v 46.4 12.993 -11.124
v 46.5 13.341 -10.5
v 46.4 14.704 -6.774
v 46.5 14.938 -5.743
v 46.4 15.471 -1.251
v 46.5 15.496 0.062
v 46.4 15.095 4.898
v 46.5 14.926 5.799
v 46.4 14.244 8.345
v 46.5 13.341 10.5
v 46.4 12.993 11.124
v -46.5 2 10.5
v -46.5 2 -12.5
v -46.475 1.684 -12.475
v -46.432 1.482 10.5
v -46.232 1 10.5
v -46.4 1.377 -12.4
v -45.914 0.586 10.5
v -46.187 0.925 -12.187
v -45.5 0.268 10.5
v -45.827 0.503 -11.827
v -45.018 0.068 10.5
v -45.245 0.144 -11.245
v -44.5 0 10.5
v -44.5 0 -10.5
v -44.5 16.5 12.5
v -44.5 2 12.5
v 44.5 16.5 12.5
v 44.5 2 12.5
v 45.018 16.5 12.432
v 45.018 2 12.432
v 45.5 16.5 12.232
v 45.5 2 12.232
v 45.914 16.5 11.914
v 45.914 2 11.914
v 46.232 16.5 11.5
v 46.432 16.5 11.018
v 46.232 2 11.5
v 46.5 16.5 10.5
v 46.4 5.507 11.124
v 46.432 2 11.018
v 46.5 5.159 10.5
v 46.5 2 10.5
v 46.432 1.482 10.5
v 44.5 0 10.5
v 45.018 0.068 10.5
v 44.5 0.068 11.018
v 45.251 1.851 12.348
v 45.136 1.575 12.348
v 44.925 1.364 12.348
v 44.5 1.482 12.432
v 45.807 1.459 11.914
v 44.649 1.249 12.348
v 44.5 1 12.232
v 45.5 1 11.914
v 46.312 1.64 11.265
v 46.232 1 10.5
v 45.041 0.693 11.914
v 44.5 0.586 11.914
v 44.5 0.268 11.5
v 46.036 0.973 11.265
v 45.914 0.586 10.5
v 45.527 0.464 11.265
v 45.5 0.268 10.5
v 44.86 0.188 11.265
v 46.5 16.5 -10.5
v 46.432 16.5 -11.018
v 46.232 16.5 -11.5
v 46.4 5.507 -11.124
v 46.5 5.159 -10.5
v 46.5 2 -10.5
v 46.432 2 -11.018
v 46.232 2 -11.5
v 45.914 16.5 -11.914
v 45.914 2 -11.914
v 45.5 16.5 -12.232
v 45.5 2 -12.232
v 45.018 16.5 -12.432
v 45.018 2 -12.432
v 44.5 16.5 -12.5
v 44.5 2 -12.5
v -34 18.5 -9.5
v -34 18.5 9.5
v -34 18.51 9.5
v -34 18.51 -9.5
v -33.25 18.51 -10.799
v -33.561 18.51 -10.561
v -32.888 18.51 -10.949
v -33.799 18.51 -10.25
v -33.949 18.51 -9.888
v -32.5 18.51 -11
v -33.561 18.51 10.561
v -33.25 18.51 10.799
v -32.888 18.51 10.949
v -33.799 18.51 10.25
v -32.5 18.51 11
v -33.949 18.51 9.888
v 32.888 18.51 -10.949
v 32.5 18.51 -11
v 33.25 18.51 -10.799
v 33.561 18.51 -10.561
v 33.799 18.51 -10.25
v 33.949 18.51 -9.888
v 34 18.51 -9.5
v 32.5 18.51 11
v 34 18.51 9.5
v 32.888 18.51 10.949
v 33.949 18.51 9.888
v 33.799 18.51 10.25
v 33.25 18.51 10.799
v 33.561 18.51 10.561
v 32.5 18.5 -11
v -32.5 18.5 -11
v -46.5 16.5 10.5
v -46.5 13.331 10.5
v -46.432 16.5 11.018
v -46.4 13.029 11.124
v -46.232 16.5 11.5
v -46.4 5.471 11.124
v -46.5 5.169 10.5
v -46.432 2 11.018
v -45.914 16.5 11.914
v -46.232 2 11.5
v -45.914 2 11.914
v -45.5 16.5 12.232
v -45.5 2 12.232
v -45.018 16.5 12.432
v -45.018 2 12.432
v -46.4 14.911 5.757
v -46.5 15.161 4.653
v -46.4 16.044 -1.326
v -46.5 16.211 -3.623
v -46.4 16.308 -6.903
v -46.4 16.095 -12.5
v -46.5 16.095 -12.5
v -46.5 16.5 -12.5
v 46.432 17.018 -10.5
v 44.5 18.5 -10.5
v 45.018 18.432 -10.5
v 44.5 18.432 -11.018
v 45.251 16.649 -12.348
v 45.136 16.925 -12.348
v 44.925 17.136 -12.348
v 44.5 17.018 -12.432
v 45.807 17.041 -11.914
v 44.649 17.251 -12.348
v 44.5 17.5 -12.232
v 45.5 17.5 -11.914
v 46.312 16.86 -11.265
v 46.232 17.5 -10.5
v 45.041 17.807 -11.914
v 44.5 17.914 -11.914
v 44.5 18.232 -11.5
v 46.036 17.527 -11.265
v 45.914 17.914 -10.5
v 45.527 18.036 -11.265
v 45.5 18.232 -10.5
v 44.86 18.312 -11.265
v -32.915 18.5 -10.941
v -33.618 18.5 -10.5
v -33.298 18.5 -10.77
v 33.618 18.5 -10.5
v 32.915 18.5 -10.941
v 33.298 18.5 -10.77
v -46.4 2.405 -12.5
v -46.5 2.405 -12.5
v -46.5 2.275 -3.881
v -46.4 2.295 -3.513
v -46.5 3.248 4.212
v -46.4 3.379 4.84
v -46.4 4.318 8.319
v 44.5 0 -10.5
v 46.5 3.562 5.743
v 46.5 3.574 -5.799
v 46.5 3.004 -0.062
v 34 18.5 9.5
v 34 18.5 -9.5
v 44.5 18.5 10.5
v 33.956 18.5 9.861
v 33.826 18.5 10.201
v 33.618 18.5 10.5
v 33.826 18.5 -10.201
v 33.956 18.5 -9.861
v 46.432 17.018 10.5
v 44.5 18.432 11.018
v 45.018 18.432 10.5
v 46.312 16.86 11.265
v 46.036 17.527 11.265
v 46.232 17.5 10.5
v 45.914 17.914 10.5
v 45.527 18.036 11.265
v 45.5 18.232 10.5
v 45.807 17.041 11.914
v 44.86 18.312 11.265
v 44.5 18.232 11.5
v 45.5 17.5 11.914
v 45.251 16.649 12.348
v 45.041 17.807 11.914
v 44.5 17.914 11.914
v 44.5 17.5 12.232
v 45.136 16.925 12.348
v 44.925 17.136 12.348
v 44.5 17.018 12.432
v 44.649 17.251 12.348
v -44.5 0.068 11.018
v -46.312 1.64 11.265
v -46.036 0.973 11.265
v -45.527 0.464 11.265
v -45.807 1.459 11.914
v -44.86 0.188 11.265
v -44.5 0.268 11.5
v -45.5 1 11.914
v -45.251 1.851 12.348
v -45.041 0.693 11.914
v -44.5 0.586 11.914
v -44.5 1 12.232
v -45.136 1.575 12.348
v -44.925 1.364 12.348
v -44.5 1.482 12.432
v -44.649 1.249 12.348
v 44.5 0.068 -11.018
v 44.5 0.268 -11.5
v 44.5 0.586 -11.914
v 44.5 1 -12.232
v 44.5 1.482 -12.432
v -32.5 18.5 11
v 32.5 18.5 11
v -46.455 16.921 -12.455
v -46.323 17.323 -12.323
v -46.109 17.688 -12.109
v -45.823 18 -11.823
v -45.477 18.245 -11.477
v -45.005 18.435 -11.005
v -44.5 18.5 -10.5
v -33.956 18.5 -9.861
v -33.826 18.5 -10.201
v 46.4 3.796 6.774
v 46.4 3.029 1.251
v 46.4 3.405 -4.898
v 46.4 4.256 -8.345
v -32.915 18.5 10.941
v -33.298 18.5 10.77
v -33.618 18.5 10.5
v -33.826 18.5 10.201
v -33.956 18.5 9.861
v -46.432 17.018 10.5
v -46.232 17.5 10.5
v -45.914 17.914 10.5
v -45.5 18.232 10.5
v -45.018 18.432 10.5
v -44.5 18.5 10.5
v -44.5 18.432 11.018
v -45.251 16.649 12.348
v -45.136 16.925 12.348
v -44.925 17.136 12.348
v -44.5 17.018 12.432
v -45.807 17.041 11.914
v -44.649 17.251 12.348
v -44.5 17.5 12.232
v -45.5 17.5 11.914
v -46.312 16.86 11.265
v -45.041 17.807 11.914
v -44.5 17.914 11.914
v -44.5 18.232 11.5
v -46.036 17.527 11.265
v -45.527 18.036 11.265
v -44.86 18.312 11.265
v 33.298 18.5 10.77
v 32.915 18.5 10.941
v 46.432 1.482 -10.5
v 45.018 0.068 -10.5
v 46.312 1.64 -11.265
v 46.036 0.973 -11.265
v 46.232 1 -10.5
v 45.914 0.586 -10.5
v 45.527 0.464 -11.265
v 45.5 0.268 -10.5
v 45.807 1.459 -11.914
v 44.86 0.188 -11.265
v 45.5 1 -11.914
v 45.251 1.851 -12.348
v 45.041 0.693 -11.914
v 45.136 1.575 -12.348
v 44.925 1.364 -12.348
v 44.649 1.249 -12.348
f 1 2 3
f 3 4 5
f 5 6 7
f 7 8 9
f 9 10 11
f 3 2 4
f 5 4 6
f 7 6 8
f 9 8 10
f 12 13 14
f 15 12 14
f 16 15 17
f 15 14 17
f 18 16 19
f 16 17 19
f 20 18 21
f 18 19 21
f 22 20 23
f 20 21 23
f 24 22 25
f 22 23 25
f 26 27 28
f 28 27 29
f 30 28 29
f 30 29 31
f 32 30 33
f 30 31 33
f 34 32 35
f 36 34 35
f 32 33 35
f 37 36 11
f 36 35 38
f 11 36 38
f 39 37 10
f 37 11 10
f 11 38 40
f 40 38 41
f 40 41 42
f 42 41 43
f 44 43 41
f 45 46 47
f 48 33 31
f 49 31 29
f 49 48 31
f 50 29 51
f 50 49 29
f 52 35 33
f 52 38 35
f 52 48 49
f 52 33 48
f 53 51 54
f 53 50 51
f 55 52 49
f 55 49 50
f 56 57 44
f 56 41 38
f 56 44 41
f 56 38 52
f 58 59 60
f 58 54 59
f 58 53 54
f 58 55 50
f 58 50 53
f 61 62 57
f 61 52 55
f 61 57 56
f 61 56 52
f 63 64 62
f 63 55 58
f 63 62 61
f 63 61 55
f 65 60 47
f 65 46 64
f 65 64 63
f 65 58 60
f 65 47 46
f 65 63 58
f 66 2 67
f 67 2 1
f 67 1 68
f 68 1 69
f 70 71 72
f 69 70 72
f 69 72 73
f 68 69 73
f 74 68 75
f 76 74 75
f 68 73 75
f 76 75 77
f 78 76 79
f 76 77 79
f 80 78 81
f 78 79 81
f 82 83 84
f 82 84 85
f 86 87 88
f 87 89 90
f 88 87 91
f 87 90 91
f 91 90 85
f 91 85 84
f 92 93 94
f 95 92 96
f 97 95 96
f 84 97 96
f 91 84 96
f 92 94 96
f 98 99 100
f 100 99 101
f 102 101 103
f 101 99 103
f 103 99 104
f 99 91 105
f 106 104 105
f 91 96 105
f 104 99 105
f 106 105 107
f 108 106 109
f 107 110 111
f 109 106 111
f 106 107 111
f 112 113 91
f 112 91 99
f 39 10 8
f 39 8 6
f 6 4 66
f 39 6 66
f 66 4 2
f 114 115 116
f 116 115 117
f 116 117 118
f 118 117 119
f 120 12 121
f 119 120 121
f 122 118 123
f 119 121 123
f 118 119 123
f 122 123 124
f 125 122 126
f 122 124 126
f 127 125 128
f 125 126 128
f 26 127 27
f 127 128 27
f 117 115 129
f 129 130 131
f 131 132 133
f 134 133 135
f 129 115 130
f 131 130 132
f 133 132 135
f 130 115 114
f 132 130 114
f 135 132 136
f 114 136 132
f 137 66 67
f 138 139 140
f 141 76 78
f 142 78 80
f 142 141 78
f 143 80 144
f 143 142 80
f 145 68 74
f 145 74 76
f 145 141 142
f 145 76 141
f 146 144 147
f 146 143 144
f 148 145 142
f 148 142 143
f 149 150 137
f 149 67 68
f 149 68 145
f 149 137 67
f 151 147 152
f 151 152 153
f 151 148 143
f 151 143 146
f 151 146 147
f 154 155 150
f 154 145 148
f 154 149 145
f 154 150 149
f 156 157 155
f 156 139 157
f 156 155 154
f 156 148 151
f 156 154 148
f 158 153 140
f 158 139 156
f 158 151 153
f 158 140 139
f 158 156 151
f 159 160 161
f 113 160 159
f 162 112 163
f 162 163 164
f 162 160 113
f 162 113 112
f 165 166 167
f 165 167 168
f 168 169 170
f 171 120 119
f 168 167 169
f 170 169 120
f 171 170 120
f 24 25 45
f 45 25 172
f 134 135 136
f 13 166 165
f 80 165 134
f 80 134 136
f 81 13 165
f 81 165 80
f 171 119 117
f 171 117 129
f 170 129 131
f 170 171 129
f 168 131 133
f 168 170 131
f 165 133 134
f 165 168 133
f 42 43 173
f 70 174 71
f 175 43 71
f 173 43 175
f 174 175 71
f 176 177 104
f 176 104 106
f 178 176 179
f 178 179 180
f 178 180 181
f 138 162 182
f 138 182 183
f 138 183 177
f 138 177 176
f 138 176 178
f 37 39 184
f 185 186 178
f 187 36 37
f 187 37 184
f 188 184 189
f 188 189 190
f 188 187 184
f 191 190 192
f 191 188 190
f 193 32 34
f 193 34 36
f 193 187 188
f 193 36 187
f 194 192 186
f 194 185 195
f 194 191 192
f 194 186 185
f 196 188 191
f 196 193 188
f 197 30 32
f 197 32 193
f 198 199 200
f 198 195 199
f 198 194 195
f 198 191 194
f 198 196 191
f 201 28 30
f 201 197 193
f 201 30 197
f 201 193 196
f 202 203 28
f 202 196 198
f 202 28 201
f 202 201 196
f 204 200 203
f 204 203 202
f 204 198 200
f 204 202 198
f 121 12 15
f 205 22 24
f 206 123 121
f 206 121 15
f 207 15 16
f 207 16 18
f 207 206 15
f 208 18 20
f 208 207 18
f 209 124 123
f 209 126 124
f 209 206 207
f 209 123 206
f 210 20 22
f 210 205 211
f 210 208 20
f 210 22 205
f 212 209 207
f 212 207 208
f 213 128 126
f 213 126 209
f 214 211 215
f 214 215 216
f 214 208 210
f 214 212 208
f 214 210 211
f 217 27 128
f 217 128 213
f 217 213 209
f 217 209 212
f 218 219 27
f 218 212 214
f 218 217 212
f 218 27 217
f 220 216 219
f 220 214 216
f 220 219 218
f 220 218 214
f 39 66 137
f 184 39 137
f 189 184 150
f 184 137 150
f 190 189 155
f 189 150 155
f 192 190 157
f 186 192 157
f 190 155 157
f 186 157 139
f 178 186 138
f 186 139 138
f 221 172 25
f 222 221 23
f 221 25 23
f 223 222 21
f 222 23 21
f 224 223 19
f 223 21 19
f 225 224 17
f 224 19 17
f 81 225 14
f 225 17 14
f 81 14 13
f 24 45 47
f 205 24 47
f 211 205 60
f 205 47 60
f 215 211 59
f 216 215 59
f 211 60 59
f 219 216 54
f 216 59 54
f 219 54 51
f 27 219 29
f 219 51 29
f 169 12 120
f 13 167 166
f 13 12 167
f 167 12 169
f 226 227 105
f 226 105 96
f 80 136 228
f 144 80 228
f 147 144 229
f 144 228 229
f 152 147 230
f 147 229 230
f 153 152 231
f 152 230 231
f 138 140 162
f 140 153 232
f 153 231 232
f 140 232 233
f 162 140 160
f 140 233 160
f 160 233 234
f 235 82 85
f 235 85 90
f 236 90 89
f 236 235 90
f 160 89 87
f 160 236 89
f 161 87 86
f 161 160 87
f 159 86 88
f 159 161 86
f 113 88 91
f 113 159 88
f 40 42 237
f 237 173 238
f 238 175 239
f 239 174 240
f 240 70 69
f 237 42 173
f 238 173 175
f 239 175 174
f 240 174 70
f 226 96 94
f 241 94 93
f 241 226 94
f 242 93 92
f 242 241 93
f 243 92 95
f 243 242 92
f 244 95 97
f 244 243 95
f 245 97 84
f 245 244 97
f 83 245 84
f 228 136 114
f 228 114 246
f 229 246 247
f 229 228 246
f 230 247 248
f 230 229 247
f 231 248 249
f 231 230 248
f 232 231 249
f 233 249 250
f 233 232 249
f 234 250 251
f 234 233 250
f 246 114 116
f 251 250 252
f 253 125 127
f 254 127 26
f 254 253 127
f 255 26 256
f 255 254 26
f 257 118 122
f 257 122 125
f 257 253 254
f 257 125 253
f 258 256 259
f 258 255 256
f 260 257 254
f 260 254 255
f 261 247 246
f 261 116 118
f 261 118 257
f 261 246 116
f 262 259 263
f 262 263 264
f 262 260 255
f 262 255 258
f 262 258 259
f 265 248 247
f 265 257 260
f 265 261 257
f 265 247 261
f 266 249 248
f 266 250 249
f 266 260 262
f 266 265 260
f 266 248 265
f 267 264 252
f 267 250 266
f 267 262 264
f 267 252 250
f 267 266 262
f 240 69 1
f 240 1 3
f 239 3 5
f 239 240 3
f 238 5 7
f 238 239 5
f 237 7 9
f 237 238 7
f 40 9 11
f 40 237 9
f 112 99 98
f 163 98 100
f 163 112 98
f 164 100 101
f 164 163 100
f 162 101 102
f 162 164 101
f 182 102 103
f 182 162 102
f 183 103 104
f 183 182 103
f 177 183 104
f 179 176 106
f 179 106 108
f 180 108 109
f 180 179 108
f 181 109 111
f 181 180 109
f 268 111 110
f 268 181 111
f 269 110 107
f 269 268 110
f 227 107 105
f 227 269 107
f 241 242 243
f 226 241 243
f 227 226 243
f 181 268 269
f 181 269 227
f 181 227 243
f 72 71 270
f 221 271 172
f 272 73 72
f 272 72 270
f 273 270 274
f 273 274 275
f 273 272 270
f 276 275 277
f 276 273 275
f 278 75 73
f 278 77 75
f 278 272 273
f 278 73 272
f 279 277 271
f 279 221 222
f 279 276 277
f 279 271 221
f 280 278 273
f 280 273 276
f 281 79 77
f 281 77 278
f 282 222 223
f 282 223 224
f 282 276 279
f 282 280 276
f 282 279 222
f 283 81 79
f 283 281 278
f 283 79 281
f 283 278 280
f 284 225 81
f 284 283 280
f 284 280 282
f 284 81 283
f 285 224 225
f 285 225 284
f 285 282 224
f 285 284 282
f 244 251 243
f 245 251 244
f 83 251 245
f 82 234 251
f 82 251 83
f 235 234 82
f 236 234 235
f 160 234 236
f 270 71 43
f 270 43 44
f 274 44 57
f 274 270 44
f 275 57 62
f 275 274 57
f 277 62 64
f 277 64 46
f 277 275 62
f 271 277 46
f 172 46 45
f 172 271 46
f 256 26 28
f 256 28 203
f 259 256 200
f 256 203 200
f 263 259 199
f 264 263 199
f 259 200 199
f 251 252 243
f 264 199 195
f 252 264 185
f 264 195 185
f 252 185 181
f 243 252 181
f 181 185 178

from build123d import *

# Parameters (mm, degrees)
SKETCH1_W           = 93
SKETCH1_H           = 25
BOSS_EXTRUDE1_DEPTH = 18.5
FILLET1_R           = 2
FILLET2_R           = 2
BOSS_EXTRUDE2_DEPTH = 0.01
SKETCH4_RX          = 13.895867653
SKETCH4_RY          = 6.24610939
CUT_EXTRUDE1_DEPTH  = 0.1
SKETCH5_RX          = 21.704276093
SKETCH5_RY          = 7.058205551
CUT_EXTRUDE2_DEPTH  = 0.1


with BuildPart() as part:
    # Sketch1 → Boss-Extrude1 (new body)
    with BuildSketch(Plane(origin=(0, 0, 0), x_dir=(1, 0, 0), z_dir=(0, 1, 0))):
        Rectangle(SKETCH1_W, SKETCH1_H)
    extrude(amount=BOSS_EXTRUDE1_DEPTH)

    # Fillet1
    fillet1_edges = [part.edges().sort_by_distance(p)[0] for p in [
        (-46.5, 18.5, 0),
        (46.5, 18.5, 0),
        (-46.5, 0, 0),
        (46.5, 0, 0),
    ]]
    fillet(fillet1_edges, radius=FILLET1_R)

    # Fillet2
    # the kernel refuses this fillet: 2 mm, written as the material it takes off along each edge
    with BuildSketch(Plane(origin=(-49.5, 18.5, -12.5), x_dir=(0, -1, 0), z_dir=(1, 0, 0))) as fillet2_piece_1:
        with BuildLine():
            CenterArc((FILLET2_R, -FILLET2_R), FILLET2_R, 90, 90)
            Line((0, -FILLET2_R), (0, 0))
            Line((0, 0), (FILLET2_R, 0))
        make_face()
    extrude(amount=94, mode=Mode.SUBTRACT)
    with BuildSketch(Plane(origin=(44.5, 18.5, 12.5), x_dir=(0, 0, -1), z_dir=(-1, 0, 0))) as fillet2_piece_2:
        with BuildLine():
            CenterArc((FILLET2_R, FILLET2_R), FILLET2_R, 180, 90)
            Line((0, FILLET2_R), (0, 0))
            Line((0, 0), (FILLET2_R, 0))
        make_face()
    extrude(amount=89, mode=Mode.SUBTRACT)
    with BuildSketch(Plane(origin=(44.5, 0, 12.5), x_dir=(0, 0, -1), z_dir=(-1, 0, 0))) as fillet2_piece_3:
        with BuildLine():
            CenterArc((FILLET2_R, -FILLET2_R), FILLET2_R, 90, 90)
            Line((0, -FILLET2_R), (0, 0))
            Line((0, 0), (FILLET2_R, 0))
        make_face()
    extrude(amount=89, mode=Mode.SUBTRACT)
    with BuildSketch(Plane(origin=(46.5, 2, 12.5), x_dir=(0, 0, -1), z_dir=(0, 1, 0)), Plane(origin=(46.5, 2, -12.5), x_dir=(-1, 0, 0), z_dir=(0, 1, 0))) as fillet2_piece_4:
        with BuildLine():
            CenterArc((FILLET2_R, FILLET2_R), FILLET2_R, 180, 90)
            Line((0, FILLET2_R), (0, 0))
            Line((0, 0), (FILLET2_R, 0))
        make_face()
    extrude(amount=14.5, mode=Mode.SUBTRACT)
    with BuildSketch(Plane(origin=(-46.5, 2, 12.5), x_dir=(0, 0, -1), z_dir=(0, 1, 0))) as fillet2_piece_5:
        with BuildLine():
            CenterArc((FILLET2_R, -FILLET2_R), FILLET2_R, 90, 90)
            Line((0, -FILLET2_R), (0, 0))
            Line((0, 0), (FILLET2_R, 0))
        make_face()
    extrude(amount=14.5, mode=Mode.SUBTRACT)
    with BuildSketch(Plane(origin=(44.5, 16.5, 12.5), x_dir=(1, 0, 0), z_dir=(0, -1, 0))) as fillet2_piece_6:
        with BuildLine():
            CenterArc((2 - FILLET2_R, -FILLET2_R), FILLET2_R, 0, 90)
            Line((2 - FILLET2_R, 0), (2, 0))
            Line((2, 0), (2, -FILLET2_R))
        make_face()
    revolve(axis=Axis((44.5, 16.5, 12.5), (0, 0, 1)), revolution_arc=90, mode=Mode.SUBTRACT)
    with BuildSketch(Plane(origin=(44.5, 2, 12.5), x_dir=(1, 0, 0), z_dir=(0, 1, 0))) as fillet2_piece_7:
        with BuildLine():
            CenterArc((2 - FILLET2_R, FILLET2_R), FILLET2_R, 270, 90)
            Line((2 - FILLET2_R, 0), (2, 0))
            Line((2, 0), (2, FILLET2_R))
        make_face()
    revolve(axis=Axis((44.5, 2, 12.5), (0, 0, -1)), revolution_arc=90, mode=Mode.SUBTRACT)
    with BuildSketch(Plane(origin=(-44.5, 2, 12.5), x_dir=(-1, 0, 0), z_dir=(0, 1, 0))) as fillet2_piece_8:
        with BuildLine():
            CenterArc((2 - FILLET2_R, -FILLET2_R), FILLET2_R, 0, 90)
            Line((2 - FILLET2_R, 0), (2, 0))
            Line((2, 0), (2, -FILLET2_R))
        make_face()
    revolve(axis=Axis((-44.5, 2, 12.5), (0, 0, 1)), revolution_arc=90, mode=Mode.SUBTRACT)
    with BuildSketch(Plane(origin=(-44.5, 16.5, 12.5), x_dir=(-1, 0, 0), z_dir=(0, -1, 0))) as fillet2_piece_9:
        with BuildLine():
            CenterArc((2 - FILLET2_R, FILLET2_R), FILLET2_R, 270, 90)
            Line((2 - FILLET2_R, 0), (2, 0))
            Line((2, 0), (2, FILLET2_R))
        make_face()
    revolve(axis=Axis((-44.5, 16.5, 12.5), (0, 0, -1)), revolution_arc=90, mode=Mode.SUBTRACT)
    with BuildSketch(Plane(origin=(-49.5, 0, -12.5), x_dir=(0, 1, 0), z_dir=(1, 0, 0))) as fillet2_piece_10:
        with BuildLine():
            CenterArc((FILLET2_R, FILLET2_R), FILLET2_R, 180, 90)
            Line((0, FILLET2_R), (0, 0))
            Line((0, 0), (FILLET2_R, 0))
        make_face()
    extrude(amount=94, mode=Mode.SUBTRACT)
    with BuildSketch(Plane(origin=(44.5, 16.5, -12.5), x_dir=(1, 0, 0), z_dir=(0, -1, 0))) as fillet2_piece_11:
        with BuildLine():
            CenterArc((2 - FILLET2_R, FILLET2_R), FILLET2_R, 270, 90)
            Line((2, FILLET2_R), (2, 0))
            Line((2, 0), (2 - FILLET2_R, 0))
        make_face()
    revolve(axis=Axis((44.5, 16.5, -12.5), (0, 0, 1)), revolution_arc=90, mode=Mode.SUBTRACT)
    with BuildSketch(Plane(origin=(44.5, 2, -12.5), x_dir=(1, 0, 0), z_dir=(0, 1, 0))) as fillet2_piece_12:
        with BuildLine():
            CenterArc((2 - FILLET2_R, -FILLET2_R), FILLET2_R, 0, 90)
            Line((2, -FILLET2_R), (2, 0))
            Line((2, 0), (2 - FILLET2_R, 0))
        make_face()
    revolve(axis=Axis((44.5, 2, -12.5), (0, 0, -1)), revolution_arc=90, mode=Mode.SUBTRACT)

    # Sketch3 → Boss-Extrude2 (add)
    with BuildSketch(Plane(origin=(0, 18.5, 0), x_dir=(-1, 0, 0), z_dir=(0, 1, 0))):
        with BuildLine():
            Line((-32.5, 11), (32.5, 11))
            ThreePointArc((32.5, 11), (33.560660172, 10.560660172), (34, 9.5))
            Line((34, 9.5), (34, -9.5))
            ThreePointArc((34, -9.5), (33.560660172, -10.560660172), (32.5, -11))
            Line((32.5, -11), (-32.5, -11))
            ThreePointArc((-32.5, -11), (-33.560660172, -10.560660172), (-34, -9.5))
            Line((-34, -9.5), (-34, 9.5))
            ThreePointArc((-34, 9.5), (-33.560660172, 10.560660172), (-32.5, 11))
        make_face()
    extrude(amount=BOSS_EXTRUDE2_DEPTH)

    # Sketch4 → Cut-Extrude1 (cut)
    with BuildSketch(Plane(origin=(46.5, 0, 0), x_dir=(0, 0, -1), z_dir=(1, 0, 0))):
        with Locations(Location((0, 9.25), (0, 0, 180))):
            Ellipse(SKETCH4_RX, SKETCH4_RY)
    extrude(amount=-CUT_EXTRUDE1_DEPTH, mode=Mode.SUBTRACT)

    # Sketch5 → Cut-Extrude2 (cut)
    with BuildSketch(Plane.ZY.offset(46.5)):
        with Locations(Location((-7.207732319, 9.25), (0, 0, 180))):
            Ellipse(SKETCH5_RX, SKETCH5_RY)
    extrude(amount=-CUT_EXTRUDE2_DEPTH, mode=Mode.SUBTRACT)


solid = part.part
